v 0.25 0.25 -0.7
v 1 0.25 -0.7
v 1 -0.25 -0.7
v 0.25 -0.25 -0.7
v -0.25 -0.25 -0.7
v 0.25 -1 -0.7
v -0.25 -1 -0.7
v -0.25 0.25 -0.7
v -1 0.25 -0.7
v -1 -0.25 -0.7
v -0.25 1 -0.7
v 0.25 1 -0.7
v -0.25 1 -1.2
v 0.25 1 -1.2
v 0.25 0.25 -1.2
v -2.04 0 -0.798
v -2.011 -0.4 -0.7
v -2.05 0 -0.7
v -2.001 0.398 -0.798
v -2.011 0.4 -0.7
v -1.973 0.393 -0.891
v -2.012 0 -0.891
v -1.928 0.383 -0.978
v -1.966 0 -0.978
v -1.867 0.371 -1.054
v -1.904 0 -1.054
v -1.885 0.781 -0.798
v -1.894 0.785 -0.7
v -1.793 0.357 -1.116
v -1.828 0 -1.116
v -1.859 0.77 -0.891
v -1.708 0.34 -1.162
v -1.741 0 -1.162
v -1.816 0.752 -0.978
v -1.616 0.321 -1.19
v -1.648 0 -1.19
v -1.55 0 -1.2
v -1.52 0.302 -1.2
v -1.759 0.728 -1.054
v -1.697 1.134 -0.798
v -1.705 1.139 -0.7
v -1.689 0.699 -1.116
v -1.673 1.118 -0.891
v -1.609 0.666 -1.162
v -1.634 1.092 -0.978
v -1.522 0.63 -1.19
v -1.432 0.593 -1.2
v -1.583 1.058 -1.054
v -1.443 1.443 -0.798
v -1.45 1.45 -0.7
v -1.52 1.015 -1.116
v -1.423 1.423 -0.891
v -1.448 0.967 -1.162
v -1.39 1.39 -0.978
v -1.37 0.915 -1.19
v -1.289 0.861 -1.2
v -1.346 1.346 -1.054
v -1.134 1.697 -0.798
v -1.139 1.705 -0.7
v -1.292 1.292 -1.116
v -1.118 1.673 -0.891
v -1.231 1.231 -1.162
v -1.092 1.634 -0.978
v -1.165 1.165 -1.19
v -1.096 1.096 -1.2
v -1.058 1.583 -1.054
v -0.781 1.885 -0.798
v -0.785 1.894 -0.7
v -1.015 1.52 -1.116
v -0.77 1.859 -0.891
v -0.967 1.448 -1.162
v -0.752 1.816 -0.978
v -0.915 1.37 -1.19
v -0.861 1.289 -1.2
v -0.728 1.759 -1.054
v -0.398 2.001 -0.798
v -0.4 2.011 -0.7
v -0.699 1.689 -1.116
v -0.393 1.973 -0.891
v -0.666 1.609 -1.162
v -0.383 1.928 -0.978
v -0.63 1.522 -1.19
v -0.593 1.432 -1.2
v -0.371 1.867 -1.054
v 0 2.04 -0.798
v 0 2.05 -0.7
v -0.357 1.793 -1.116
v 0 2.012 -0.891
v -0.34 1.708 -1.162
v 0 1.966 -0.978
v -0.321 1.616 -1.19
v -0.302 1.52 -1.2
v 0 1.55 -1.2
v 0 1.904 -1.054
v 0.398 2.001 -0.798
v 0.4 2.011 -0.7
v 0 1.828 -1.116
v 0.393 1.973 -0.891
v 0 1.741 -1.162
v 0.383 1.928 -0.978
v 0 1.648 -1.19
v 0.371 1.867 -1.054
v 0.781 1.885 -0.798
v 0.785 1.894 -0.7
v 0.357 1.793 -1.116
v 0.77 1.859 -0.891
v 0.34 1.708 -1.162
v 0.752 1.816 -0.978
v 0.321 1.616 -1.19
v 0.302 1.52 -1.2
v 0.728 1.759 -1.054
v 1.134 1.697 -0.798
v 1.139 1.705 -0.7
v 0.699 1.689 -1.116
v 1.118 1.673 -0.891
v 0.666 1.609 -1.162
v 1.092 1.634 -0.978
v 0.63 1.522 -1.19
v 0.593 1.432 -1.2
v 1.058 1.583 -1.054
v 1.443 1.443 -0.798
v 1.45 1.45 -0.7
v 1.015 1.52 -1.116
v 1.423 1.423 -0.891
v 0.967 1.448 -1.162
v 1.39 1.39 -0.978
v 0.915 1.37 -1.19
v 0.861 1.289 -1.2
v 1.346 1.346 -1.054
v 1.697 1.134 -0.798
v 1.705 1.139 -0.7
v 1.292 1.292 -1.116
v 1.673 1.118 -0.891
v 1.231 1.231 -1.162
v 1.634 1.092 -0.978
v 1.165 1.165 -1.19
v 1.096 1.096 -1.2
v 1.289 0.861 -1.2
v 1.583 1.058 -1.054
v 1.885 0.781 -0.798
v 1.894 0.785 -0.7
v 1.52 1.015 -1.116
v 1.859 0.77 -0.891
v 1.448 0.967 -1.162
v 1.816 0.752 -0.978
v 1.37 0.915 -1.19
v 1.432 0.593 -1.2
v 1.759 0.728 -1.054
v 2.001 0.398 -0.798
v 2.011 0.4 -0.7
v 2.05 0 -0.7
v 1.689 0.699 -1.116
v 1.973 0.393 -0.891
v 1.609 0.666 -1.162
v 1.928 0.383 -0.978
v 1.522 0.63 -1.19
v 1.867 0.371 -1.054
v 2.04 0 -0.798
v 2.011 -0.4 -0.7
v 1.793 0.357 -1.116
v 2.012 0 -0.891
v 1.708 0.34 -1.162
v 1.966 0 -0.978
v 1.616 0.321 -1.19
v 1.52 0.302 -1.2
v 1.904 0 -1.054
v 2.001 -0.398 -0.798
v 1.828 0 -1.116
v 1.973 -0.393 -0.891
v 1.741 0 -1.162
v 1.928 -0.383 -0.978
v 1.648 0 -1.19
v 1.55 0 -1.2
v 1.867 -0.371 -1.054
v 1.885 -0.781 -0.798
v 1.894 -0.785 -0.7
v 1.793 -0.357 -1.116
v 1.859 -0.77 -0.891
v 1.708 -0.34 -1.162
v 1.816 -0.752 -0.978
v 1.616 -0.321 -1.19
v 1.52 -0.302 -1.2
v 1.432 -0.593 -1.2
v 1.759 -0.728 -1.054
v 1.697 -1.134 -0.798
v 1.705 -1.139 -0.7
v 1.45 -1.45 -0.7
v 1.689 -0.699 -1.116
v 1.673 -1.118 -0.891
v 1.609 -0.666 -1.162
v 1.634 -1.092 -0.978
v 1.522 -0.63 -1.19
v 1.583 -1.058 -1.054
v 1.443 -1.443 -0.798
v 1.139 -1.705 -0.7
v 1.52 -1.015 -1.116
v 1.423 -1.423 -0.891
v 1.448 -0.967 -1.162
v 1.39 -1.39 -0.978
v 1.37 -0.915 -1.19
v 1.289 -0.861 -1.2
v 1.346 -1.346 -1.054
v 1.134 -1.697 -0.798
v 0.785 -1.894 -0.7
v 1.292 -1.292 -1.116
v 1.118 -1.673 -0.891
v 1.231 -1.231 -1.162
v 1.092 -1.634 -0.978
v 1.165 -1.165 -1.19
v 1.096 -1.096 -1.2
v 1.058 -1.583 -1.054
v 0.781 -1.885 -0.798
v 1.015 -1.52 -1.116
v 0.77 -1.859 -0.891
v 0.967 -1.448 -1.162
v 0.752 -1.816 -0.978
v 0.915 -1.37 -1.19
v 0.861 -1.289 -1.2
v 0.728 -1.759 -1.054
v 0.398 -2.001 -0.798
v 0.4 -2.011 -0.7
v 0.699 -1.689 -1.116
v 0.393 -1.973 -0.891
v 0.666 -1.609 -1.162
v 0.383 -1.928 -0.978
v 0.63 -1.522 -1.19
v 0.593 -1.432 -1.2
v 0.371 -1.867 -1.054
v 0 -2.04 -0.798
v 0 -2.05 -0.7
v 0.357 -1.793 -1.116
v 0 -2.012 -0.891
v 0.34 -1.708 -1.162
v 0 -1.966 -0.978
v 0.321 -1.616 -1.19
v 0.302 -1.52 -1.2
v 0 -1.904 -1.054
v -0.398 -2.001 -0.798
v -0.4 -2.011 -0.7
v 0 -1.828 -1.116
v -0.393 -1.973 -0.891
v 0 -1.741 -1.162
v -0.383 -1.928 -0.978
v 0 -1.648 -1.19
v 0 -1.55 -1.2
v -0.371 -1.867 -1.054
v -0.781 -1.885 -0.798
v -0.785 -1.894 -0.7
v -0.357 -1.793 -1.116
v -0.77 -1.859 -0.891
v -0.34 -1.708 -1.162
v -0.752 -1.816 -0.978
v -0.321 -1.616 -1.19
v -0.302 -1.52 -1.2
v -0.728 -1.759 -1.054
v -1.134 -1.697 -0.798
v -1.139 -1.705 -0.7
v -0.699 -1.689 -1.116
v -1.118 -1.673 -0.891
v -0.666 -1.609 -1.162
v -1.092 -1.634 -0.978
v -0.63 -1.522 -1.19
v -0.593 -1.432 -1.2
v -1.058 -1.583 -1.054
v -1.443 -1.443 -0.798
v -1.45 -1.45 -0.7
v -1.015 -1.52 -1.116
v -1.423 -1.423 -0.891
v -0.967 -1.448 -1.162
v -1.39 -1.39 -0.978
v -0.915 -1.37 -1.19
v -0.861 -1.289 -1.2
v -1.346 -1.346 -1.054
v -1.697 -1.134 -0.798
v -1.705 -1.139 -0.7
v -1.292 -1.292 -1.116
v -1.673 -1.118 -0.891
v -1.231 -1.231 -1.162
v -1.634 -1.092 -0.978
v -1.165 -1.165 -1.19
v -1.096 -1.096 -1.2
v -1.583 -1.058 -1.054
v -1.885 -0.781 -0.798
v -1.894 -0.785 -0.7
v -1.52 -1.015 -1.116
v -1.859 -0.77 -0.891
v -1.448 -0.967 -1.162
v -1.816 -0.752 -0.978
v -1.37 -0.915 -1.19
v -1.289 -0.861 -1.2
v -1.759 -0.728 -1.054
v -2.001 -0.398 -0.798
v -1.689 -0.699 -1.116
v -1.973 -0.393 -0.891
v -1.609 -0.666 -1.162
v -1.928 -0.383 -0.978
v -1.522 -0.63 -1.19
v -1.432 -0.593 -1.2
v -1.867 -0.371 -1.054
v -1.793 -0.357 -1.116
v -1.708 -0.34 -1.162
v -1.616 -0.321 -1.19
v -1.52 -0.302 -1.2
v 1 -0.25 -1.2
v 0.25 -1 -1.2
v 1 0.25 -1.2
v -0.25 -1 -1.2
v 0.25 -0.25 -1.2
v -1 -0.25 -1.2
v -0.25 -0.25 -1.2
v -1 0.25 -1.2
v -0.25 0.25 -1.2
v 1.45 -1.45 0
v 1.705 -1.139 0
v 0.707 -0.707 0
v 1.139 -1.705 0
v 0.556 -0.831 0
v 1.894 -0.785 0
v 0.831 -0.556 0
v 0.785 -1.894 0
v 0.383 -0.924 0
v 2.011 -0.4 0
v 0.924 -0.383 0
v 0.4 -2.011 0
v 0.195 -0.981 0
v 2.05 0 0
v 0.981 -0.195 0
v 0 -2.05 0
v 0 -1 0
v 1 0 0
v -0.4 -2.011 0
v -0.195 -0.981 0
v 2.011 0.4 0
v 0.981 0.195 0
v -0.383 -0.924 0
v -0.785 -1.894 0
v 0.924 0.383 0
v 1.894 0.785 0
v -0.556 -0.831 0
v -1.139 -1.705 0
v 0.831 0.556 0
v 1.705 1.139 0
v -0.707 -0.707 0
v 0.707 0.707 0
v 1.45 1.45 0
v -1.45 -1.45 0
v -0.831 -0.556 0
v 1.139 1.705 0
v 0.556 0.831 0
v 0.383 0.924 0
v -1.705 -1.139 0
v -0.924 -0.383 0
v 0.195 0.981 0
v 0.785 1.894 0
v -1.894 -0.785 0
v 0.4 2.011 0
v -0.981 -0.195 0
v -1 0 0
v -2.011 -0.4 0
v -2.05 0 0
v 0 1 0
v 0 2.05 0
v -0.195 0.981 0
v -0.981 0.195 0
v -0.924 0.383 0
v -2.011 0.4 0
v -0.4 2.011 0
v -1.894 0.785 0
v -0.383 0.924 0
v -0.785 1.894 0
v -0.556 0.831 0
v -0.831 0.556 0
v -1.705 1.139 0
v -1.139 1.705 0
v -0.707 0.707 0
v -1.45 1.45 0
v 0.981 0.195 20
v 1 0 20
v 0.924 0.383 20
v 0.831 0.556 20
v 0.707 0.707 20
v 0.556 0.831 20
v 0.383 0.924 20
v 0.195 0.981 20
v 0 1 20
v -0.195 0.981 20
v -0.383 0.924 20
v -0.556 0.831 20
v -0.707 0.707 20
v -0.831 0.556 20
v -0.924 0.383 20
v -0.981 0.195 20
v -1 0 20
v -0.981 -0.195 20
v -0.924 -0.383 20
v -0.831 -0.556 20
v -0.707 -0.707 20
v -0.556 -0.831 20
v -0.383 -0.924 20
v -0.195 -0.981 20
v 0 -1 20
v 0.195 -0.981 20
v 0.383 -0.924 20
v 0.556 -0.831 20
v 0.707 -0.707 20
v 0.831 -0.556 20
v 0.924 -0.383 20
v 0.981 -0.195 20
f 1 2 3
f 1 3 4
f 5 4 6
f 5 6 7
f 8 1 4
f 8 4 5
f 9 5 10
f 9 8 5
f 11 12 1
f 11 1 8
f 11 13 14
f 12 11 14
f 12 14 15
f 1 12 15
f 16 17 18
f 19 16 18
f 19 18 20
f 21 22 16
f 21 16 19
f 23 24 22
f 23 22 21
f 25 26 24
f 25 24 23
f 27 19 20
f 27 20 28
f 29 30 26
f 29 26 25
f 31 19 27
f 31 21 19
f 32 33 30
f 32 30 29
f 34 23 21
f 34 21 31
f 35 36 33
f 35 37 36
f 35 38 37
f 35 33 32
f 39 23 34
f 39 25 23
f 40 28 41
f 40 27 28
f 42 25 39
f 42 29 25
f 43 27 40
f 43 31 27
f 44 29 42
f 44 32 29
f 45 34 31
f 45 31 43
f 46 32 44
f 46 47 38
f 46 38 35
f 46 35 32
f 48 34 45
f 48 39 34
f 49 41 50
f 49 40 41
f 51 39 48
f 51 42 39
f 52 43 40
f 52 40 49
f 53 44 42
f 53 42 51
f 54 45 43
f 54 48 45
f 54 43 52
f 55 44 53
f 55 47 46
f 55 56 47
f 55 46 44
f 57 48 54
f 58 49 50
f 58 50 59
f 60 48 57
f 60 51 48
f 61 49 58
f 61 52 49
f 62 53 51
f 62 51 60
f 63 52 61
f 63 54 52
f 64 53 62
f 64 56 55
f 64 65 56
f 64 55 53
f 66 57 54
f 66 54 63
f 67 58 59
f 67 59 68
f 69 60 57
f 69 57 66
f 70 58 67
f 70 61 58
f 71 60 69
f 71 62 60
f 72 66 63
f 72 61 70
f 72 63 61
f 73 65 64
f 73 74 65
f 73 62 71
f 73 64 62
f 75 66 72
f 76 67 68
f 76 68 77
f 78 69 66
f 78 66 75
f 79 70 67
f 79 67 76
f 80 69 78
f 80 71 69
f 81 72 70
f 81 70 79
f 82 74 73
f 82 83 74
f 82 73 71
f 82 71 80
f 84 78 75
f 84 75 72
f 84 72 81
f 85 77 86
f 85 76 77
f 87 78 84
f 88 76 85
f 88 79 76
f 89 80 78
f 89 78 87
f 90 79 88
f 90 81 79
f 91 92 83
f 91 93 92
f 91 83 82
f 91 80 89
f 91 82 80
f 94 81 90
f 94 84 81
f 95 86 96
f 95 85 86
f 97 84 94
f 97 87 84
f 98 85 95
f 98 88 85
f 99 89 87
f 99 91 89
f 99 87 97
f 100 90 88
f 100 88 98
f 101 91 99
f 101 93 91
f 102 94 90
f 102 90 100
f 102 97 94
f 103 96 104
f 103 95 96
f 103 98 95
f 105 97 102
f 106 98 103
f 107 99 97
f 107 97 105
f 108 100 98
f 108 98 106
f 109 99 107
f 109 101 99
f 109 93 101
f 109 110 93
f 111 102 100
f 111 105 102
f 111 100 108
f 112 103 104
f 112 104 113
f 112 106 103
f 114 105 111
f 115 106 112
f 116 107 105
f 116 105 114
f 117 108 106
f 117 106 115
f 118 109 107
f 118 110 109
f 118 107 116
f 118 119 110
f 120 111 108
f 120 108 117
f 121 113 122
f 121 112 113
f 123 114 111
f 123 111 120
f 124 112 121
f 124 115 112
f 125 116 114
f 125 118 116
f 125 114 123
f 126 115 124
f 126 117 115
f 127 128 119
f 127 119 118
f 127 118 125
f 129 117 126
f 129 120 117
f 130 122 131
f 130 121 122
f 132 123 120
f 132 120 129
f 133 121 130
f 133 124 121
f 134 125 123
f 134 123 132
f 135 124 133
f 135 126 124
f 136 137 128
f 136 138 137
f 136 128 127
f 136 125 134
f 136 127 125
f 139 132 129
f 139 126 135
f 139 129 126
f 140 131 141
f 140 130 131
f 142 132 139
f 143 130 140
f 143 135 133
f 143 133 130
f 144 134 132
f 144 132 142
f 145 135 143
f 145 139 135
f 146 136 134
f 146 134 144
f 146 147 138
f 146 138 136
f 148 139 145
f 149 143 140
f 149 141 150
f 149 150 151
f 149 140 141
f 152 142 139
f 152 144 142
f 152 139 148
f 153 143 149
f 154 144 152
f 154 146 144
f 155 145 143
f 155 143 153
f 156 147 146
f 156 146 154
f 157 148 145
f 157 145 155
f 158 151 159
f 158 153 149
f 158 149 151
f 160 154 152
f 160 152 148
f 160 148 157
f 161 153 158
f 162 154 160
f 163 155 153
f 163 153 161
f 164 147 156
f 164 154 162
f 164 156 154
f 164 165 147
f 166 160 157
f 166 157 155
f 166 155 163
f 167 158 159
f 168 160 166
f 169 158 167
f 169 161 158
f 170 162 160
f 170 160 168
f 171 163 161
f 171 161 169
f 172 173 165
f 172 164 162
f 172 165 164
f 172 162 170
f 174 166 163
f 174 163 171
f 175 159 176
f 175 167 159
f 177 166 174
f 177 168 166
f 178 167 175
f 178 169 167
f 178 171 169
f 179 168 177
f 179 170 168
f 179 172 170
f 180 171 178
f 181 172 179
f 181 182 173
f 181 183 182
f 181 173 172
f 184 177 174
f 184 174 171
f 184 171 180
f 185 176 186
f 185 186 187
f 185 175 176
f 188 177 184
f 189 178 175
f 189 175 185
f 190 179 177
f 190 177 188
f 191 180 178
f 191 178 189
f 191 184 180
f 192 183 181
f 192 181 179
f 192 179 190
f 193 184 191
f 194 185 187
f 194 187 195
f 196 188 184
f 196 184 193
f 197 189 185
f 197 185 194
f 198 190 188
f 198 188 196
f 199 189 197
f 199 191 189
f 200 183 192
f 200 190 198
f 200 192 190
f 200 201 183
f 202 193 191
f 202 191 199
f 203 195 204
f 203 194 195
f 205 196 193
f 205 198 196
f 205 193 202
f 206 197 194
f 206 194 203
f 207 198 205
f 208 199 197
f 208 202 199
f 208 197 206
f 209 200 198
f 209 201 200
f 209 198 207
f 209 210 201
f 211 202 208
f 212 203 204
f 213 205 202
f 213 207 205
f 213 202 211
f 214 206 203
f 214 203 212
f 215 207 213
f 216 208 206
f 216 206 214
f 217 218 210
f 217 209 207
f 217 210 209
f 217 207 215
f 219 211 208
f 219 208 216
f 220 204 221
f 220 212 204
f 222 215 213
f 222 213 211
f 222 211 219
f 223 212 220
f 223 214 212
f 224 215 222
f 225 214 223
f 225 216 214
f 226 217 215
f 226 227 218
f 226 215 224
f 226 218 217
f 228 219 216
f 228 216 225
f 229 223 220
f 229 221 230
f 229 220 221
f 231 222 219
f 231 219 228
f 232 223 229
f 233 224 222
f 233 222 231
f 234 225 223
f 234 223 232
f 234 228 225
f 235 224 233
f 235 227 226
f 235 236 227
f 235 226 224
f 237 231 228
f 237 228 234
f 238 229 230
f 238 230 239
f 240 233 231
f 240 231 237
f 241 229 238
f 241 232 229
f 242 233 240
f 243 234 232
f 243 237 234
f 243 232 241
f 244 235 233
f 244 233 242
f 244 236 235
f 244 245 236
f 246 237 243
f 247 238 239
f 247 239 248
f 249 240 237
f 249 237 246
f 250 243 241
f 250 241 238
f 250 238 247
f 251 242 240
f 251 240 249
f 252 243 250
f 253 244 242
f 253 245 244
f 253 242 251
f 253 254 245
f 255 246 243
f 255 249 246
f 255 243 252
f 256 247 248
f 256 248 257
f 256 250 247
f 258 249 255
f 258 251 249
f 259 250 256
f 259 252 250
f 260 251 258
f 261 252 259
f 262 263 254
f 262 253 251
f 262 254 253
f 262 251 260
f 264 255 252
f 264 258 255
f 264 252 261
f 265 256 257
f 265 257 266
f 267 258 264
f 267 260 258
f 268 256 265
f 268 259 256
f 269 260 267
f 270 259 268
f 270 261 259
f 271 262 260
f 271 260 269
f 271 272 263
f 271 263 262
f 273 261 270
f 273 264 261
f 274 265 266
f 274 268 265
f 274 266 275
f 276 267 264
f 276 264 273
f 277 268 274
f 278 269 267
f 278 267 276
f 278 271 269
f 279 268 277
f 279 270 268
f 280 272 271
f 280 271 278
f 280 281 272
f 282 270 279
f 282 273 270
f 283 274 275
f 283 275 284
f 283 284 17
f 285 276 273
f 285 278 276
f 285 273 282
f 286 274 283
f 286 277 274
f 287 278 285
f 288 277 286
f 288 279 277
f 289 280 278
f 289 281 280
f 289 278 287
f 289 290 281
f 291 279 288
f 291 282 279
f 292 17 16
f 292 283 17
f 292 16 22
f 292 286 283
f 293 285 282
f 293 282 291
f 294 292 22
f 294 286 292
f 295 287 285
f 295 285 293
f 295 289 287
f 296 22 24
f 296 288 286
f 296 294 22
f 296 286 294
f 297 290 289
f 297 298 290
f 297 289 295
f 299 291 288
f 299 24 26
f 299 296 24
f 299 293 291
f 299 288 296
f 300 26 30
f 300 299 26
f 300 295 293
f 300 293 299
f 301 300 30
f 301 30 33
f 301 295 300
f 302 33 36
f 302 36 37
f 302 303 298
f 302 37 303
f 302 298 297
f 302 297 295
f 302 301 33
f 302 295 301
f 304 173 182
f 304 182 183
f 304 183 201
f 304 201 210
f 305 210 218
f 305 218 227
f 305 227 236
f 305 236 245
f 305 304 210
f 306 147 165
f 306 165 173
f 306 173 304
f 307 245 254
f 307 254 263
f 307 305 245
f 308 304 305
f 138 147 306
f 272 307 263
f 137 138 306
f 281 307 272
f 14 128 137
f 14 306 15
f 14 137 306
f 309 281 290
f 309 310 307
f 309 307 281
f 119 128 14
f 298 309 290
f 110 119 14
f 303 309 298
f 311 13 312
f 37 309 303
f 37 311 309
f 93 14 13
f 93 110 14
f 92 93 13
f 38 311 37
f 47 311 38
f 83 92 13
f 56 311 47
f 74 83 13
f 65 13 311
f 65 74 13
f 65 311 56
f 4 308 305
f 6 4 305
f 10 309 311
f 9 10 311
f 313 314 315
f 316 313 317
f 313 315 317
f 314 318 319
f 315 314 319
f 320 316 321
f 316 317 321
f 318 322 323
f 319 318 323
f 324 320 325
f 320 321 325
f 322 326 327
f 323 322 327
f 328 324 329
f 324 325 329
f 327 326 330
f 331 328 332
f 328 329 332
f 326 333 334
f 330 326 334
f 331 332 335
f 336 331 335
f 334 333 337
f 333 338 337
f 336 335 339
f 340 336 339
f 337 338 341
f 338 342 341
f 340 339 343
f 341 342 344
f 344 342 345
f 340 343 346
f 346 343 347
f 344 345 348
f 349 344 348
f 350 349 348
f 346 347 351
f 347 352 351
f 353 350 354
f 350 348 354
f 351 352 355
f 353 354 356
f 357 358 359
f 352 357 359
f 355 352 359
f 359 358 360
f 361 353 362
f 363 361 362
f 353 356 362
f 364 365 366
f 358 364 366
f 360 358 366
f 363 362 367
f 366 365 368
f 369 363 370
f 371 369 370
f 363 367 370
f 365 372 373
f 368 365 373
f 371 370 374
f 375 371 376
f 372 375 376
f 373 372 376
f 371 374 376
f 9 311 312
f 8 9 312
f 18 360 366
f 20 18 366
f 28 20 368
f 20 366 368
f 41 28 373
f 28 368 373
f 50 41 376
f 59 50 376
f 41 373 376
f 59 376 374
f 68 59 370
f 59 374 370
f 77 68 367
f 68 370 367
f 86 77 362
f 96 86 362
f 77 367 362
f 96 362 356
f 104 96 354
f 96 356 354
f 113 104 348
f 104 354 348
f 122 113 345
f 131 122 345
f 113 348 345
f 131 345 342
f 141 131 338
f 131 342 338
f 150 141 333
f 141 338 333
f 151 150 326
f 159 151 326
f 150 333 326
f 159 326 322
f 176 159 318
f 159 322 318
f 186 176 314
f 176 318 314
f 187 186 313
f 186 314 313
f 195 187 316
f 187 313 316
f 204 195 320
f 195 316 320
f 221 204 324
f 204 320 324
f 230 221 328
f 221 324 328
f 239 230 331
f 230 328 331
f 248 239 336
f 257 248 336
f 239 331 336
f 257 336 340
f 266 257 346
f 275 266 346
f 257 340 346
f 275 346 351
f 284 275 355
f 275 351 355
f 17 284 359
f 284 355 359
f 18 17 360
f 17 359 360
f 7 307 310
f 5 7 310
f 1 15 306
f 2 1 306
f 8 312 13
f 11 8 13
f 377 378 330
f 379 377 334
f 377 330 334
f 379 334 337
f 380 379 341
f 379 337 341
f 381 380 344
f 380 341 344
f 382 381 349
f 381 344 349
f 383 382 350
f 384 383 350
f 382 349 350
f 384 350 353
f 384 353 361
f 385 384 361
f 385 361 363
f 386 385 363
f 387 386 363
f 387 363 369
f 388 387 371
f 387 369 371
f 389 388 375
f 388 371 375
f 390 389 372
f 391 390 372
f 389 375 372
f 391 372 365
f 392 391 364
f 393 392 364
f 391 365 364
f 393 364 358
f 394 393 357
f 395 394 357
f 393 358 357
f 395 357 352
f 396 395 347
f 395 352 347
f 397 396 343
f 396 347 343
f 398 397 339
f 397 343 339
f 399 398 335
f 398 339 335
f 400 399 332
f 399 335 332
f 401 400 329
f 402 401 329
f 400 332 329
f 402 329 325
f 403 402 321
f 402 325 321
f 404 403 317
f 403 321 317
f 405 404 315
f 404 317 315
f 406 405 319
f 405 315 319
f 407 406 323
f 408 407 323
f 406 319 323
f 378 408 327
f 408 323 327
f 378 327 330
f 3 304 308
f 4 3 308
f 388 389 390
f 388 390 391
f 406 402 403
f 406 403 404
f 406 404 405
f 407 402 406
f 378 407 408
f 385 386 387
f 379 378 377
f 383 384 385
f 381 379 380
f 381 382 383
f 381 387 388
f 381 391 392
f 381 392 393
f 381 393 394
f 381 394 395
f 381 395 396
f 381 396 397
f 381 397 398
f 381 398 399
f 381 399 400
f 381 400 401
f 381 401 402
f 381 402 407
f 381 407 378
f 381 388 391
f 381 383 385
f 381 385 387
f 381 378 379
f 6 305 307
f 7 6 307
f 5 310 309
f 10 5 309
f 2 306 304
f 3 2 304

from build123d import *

# Parameters (mm, degrees)
SCHIZZO1_R                   = 1
ESTRUSIONE_ESTRUSIONE1_DEPTH = 20
SCHIZZO2_R                   = 2.05
ESTRUSIONE_ESTRUSIONE2_DEPTH = 1.2
RACCORDO1_R                  = 0.5
TAGLIO_ESTRUSIONE1_DEPTH     = 0.5


with BuildPart() as part:
    # Schizzo1 → Estrusione-Estrusione1 (new body)
    with BuildSketch(Plane.XY):
        Circle(SCHIZZO1_R)
    extrude(amount=ESTRUSIONE_ESTRUSIONE1_DEPTH)

    # Schizzo2 → Estrusione-Estrusione2 (add)
    with BuildSketch(Plane(origin=(0, 0, 0), x_dir=(-1, 0, 0), z_dir=(0, 0, -1))):
        Circle(SCHIZZO2_R)
    extrude(amount=ESTRUSIONE_ESTRUSIONE2_DEPTH)

    # Raccordo1
    raccordo1_edges = [part.edges().sort_by_distance(p)[0] for p in [
        (2.05, 0, -1.2),
    ]]
    fillet(raccordo1_edges, radius=RACCORDO1_R)

    # Schizzo3 → Taglio-Estrusione1 (cut)
    with BuildSketch(Plane(origin=(0, 0, -1.2), x_dir=(-1, 0, 0), z_dir=(0, 0, -1))):
        Polygon((-0.25, 0.25), (-1, 0.25), (-1, -0.25), (-0.25, -0.25), (-0.25, -1), (0.25, -1), (0.25, -0.25), (1, -0.25), (1, 0.25), (0.25, 0.25), (0.25, 1), (-0.25, 1), align=None)
    extrude(amount=-TAGLIO_ESTRUSIONE1_DEPTH, mode=Mode.SUBTRACT)


solid = part.part
